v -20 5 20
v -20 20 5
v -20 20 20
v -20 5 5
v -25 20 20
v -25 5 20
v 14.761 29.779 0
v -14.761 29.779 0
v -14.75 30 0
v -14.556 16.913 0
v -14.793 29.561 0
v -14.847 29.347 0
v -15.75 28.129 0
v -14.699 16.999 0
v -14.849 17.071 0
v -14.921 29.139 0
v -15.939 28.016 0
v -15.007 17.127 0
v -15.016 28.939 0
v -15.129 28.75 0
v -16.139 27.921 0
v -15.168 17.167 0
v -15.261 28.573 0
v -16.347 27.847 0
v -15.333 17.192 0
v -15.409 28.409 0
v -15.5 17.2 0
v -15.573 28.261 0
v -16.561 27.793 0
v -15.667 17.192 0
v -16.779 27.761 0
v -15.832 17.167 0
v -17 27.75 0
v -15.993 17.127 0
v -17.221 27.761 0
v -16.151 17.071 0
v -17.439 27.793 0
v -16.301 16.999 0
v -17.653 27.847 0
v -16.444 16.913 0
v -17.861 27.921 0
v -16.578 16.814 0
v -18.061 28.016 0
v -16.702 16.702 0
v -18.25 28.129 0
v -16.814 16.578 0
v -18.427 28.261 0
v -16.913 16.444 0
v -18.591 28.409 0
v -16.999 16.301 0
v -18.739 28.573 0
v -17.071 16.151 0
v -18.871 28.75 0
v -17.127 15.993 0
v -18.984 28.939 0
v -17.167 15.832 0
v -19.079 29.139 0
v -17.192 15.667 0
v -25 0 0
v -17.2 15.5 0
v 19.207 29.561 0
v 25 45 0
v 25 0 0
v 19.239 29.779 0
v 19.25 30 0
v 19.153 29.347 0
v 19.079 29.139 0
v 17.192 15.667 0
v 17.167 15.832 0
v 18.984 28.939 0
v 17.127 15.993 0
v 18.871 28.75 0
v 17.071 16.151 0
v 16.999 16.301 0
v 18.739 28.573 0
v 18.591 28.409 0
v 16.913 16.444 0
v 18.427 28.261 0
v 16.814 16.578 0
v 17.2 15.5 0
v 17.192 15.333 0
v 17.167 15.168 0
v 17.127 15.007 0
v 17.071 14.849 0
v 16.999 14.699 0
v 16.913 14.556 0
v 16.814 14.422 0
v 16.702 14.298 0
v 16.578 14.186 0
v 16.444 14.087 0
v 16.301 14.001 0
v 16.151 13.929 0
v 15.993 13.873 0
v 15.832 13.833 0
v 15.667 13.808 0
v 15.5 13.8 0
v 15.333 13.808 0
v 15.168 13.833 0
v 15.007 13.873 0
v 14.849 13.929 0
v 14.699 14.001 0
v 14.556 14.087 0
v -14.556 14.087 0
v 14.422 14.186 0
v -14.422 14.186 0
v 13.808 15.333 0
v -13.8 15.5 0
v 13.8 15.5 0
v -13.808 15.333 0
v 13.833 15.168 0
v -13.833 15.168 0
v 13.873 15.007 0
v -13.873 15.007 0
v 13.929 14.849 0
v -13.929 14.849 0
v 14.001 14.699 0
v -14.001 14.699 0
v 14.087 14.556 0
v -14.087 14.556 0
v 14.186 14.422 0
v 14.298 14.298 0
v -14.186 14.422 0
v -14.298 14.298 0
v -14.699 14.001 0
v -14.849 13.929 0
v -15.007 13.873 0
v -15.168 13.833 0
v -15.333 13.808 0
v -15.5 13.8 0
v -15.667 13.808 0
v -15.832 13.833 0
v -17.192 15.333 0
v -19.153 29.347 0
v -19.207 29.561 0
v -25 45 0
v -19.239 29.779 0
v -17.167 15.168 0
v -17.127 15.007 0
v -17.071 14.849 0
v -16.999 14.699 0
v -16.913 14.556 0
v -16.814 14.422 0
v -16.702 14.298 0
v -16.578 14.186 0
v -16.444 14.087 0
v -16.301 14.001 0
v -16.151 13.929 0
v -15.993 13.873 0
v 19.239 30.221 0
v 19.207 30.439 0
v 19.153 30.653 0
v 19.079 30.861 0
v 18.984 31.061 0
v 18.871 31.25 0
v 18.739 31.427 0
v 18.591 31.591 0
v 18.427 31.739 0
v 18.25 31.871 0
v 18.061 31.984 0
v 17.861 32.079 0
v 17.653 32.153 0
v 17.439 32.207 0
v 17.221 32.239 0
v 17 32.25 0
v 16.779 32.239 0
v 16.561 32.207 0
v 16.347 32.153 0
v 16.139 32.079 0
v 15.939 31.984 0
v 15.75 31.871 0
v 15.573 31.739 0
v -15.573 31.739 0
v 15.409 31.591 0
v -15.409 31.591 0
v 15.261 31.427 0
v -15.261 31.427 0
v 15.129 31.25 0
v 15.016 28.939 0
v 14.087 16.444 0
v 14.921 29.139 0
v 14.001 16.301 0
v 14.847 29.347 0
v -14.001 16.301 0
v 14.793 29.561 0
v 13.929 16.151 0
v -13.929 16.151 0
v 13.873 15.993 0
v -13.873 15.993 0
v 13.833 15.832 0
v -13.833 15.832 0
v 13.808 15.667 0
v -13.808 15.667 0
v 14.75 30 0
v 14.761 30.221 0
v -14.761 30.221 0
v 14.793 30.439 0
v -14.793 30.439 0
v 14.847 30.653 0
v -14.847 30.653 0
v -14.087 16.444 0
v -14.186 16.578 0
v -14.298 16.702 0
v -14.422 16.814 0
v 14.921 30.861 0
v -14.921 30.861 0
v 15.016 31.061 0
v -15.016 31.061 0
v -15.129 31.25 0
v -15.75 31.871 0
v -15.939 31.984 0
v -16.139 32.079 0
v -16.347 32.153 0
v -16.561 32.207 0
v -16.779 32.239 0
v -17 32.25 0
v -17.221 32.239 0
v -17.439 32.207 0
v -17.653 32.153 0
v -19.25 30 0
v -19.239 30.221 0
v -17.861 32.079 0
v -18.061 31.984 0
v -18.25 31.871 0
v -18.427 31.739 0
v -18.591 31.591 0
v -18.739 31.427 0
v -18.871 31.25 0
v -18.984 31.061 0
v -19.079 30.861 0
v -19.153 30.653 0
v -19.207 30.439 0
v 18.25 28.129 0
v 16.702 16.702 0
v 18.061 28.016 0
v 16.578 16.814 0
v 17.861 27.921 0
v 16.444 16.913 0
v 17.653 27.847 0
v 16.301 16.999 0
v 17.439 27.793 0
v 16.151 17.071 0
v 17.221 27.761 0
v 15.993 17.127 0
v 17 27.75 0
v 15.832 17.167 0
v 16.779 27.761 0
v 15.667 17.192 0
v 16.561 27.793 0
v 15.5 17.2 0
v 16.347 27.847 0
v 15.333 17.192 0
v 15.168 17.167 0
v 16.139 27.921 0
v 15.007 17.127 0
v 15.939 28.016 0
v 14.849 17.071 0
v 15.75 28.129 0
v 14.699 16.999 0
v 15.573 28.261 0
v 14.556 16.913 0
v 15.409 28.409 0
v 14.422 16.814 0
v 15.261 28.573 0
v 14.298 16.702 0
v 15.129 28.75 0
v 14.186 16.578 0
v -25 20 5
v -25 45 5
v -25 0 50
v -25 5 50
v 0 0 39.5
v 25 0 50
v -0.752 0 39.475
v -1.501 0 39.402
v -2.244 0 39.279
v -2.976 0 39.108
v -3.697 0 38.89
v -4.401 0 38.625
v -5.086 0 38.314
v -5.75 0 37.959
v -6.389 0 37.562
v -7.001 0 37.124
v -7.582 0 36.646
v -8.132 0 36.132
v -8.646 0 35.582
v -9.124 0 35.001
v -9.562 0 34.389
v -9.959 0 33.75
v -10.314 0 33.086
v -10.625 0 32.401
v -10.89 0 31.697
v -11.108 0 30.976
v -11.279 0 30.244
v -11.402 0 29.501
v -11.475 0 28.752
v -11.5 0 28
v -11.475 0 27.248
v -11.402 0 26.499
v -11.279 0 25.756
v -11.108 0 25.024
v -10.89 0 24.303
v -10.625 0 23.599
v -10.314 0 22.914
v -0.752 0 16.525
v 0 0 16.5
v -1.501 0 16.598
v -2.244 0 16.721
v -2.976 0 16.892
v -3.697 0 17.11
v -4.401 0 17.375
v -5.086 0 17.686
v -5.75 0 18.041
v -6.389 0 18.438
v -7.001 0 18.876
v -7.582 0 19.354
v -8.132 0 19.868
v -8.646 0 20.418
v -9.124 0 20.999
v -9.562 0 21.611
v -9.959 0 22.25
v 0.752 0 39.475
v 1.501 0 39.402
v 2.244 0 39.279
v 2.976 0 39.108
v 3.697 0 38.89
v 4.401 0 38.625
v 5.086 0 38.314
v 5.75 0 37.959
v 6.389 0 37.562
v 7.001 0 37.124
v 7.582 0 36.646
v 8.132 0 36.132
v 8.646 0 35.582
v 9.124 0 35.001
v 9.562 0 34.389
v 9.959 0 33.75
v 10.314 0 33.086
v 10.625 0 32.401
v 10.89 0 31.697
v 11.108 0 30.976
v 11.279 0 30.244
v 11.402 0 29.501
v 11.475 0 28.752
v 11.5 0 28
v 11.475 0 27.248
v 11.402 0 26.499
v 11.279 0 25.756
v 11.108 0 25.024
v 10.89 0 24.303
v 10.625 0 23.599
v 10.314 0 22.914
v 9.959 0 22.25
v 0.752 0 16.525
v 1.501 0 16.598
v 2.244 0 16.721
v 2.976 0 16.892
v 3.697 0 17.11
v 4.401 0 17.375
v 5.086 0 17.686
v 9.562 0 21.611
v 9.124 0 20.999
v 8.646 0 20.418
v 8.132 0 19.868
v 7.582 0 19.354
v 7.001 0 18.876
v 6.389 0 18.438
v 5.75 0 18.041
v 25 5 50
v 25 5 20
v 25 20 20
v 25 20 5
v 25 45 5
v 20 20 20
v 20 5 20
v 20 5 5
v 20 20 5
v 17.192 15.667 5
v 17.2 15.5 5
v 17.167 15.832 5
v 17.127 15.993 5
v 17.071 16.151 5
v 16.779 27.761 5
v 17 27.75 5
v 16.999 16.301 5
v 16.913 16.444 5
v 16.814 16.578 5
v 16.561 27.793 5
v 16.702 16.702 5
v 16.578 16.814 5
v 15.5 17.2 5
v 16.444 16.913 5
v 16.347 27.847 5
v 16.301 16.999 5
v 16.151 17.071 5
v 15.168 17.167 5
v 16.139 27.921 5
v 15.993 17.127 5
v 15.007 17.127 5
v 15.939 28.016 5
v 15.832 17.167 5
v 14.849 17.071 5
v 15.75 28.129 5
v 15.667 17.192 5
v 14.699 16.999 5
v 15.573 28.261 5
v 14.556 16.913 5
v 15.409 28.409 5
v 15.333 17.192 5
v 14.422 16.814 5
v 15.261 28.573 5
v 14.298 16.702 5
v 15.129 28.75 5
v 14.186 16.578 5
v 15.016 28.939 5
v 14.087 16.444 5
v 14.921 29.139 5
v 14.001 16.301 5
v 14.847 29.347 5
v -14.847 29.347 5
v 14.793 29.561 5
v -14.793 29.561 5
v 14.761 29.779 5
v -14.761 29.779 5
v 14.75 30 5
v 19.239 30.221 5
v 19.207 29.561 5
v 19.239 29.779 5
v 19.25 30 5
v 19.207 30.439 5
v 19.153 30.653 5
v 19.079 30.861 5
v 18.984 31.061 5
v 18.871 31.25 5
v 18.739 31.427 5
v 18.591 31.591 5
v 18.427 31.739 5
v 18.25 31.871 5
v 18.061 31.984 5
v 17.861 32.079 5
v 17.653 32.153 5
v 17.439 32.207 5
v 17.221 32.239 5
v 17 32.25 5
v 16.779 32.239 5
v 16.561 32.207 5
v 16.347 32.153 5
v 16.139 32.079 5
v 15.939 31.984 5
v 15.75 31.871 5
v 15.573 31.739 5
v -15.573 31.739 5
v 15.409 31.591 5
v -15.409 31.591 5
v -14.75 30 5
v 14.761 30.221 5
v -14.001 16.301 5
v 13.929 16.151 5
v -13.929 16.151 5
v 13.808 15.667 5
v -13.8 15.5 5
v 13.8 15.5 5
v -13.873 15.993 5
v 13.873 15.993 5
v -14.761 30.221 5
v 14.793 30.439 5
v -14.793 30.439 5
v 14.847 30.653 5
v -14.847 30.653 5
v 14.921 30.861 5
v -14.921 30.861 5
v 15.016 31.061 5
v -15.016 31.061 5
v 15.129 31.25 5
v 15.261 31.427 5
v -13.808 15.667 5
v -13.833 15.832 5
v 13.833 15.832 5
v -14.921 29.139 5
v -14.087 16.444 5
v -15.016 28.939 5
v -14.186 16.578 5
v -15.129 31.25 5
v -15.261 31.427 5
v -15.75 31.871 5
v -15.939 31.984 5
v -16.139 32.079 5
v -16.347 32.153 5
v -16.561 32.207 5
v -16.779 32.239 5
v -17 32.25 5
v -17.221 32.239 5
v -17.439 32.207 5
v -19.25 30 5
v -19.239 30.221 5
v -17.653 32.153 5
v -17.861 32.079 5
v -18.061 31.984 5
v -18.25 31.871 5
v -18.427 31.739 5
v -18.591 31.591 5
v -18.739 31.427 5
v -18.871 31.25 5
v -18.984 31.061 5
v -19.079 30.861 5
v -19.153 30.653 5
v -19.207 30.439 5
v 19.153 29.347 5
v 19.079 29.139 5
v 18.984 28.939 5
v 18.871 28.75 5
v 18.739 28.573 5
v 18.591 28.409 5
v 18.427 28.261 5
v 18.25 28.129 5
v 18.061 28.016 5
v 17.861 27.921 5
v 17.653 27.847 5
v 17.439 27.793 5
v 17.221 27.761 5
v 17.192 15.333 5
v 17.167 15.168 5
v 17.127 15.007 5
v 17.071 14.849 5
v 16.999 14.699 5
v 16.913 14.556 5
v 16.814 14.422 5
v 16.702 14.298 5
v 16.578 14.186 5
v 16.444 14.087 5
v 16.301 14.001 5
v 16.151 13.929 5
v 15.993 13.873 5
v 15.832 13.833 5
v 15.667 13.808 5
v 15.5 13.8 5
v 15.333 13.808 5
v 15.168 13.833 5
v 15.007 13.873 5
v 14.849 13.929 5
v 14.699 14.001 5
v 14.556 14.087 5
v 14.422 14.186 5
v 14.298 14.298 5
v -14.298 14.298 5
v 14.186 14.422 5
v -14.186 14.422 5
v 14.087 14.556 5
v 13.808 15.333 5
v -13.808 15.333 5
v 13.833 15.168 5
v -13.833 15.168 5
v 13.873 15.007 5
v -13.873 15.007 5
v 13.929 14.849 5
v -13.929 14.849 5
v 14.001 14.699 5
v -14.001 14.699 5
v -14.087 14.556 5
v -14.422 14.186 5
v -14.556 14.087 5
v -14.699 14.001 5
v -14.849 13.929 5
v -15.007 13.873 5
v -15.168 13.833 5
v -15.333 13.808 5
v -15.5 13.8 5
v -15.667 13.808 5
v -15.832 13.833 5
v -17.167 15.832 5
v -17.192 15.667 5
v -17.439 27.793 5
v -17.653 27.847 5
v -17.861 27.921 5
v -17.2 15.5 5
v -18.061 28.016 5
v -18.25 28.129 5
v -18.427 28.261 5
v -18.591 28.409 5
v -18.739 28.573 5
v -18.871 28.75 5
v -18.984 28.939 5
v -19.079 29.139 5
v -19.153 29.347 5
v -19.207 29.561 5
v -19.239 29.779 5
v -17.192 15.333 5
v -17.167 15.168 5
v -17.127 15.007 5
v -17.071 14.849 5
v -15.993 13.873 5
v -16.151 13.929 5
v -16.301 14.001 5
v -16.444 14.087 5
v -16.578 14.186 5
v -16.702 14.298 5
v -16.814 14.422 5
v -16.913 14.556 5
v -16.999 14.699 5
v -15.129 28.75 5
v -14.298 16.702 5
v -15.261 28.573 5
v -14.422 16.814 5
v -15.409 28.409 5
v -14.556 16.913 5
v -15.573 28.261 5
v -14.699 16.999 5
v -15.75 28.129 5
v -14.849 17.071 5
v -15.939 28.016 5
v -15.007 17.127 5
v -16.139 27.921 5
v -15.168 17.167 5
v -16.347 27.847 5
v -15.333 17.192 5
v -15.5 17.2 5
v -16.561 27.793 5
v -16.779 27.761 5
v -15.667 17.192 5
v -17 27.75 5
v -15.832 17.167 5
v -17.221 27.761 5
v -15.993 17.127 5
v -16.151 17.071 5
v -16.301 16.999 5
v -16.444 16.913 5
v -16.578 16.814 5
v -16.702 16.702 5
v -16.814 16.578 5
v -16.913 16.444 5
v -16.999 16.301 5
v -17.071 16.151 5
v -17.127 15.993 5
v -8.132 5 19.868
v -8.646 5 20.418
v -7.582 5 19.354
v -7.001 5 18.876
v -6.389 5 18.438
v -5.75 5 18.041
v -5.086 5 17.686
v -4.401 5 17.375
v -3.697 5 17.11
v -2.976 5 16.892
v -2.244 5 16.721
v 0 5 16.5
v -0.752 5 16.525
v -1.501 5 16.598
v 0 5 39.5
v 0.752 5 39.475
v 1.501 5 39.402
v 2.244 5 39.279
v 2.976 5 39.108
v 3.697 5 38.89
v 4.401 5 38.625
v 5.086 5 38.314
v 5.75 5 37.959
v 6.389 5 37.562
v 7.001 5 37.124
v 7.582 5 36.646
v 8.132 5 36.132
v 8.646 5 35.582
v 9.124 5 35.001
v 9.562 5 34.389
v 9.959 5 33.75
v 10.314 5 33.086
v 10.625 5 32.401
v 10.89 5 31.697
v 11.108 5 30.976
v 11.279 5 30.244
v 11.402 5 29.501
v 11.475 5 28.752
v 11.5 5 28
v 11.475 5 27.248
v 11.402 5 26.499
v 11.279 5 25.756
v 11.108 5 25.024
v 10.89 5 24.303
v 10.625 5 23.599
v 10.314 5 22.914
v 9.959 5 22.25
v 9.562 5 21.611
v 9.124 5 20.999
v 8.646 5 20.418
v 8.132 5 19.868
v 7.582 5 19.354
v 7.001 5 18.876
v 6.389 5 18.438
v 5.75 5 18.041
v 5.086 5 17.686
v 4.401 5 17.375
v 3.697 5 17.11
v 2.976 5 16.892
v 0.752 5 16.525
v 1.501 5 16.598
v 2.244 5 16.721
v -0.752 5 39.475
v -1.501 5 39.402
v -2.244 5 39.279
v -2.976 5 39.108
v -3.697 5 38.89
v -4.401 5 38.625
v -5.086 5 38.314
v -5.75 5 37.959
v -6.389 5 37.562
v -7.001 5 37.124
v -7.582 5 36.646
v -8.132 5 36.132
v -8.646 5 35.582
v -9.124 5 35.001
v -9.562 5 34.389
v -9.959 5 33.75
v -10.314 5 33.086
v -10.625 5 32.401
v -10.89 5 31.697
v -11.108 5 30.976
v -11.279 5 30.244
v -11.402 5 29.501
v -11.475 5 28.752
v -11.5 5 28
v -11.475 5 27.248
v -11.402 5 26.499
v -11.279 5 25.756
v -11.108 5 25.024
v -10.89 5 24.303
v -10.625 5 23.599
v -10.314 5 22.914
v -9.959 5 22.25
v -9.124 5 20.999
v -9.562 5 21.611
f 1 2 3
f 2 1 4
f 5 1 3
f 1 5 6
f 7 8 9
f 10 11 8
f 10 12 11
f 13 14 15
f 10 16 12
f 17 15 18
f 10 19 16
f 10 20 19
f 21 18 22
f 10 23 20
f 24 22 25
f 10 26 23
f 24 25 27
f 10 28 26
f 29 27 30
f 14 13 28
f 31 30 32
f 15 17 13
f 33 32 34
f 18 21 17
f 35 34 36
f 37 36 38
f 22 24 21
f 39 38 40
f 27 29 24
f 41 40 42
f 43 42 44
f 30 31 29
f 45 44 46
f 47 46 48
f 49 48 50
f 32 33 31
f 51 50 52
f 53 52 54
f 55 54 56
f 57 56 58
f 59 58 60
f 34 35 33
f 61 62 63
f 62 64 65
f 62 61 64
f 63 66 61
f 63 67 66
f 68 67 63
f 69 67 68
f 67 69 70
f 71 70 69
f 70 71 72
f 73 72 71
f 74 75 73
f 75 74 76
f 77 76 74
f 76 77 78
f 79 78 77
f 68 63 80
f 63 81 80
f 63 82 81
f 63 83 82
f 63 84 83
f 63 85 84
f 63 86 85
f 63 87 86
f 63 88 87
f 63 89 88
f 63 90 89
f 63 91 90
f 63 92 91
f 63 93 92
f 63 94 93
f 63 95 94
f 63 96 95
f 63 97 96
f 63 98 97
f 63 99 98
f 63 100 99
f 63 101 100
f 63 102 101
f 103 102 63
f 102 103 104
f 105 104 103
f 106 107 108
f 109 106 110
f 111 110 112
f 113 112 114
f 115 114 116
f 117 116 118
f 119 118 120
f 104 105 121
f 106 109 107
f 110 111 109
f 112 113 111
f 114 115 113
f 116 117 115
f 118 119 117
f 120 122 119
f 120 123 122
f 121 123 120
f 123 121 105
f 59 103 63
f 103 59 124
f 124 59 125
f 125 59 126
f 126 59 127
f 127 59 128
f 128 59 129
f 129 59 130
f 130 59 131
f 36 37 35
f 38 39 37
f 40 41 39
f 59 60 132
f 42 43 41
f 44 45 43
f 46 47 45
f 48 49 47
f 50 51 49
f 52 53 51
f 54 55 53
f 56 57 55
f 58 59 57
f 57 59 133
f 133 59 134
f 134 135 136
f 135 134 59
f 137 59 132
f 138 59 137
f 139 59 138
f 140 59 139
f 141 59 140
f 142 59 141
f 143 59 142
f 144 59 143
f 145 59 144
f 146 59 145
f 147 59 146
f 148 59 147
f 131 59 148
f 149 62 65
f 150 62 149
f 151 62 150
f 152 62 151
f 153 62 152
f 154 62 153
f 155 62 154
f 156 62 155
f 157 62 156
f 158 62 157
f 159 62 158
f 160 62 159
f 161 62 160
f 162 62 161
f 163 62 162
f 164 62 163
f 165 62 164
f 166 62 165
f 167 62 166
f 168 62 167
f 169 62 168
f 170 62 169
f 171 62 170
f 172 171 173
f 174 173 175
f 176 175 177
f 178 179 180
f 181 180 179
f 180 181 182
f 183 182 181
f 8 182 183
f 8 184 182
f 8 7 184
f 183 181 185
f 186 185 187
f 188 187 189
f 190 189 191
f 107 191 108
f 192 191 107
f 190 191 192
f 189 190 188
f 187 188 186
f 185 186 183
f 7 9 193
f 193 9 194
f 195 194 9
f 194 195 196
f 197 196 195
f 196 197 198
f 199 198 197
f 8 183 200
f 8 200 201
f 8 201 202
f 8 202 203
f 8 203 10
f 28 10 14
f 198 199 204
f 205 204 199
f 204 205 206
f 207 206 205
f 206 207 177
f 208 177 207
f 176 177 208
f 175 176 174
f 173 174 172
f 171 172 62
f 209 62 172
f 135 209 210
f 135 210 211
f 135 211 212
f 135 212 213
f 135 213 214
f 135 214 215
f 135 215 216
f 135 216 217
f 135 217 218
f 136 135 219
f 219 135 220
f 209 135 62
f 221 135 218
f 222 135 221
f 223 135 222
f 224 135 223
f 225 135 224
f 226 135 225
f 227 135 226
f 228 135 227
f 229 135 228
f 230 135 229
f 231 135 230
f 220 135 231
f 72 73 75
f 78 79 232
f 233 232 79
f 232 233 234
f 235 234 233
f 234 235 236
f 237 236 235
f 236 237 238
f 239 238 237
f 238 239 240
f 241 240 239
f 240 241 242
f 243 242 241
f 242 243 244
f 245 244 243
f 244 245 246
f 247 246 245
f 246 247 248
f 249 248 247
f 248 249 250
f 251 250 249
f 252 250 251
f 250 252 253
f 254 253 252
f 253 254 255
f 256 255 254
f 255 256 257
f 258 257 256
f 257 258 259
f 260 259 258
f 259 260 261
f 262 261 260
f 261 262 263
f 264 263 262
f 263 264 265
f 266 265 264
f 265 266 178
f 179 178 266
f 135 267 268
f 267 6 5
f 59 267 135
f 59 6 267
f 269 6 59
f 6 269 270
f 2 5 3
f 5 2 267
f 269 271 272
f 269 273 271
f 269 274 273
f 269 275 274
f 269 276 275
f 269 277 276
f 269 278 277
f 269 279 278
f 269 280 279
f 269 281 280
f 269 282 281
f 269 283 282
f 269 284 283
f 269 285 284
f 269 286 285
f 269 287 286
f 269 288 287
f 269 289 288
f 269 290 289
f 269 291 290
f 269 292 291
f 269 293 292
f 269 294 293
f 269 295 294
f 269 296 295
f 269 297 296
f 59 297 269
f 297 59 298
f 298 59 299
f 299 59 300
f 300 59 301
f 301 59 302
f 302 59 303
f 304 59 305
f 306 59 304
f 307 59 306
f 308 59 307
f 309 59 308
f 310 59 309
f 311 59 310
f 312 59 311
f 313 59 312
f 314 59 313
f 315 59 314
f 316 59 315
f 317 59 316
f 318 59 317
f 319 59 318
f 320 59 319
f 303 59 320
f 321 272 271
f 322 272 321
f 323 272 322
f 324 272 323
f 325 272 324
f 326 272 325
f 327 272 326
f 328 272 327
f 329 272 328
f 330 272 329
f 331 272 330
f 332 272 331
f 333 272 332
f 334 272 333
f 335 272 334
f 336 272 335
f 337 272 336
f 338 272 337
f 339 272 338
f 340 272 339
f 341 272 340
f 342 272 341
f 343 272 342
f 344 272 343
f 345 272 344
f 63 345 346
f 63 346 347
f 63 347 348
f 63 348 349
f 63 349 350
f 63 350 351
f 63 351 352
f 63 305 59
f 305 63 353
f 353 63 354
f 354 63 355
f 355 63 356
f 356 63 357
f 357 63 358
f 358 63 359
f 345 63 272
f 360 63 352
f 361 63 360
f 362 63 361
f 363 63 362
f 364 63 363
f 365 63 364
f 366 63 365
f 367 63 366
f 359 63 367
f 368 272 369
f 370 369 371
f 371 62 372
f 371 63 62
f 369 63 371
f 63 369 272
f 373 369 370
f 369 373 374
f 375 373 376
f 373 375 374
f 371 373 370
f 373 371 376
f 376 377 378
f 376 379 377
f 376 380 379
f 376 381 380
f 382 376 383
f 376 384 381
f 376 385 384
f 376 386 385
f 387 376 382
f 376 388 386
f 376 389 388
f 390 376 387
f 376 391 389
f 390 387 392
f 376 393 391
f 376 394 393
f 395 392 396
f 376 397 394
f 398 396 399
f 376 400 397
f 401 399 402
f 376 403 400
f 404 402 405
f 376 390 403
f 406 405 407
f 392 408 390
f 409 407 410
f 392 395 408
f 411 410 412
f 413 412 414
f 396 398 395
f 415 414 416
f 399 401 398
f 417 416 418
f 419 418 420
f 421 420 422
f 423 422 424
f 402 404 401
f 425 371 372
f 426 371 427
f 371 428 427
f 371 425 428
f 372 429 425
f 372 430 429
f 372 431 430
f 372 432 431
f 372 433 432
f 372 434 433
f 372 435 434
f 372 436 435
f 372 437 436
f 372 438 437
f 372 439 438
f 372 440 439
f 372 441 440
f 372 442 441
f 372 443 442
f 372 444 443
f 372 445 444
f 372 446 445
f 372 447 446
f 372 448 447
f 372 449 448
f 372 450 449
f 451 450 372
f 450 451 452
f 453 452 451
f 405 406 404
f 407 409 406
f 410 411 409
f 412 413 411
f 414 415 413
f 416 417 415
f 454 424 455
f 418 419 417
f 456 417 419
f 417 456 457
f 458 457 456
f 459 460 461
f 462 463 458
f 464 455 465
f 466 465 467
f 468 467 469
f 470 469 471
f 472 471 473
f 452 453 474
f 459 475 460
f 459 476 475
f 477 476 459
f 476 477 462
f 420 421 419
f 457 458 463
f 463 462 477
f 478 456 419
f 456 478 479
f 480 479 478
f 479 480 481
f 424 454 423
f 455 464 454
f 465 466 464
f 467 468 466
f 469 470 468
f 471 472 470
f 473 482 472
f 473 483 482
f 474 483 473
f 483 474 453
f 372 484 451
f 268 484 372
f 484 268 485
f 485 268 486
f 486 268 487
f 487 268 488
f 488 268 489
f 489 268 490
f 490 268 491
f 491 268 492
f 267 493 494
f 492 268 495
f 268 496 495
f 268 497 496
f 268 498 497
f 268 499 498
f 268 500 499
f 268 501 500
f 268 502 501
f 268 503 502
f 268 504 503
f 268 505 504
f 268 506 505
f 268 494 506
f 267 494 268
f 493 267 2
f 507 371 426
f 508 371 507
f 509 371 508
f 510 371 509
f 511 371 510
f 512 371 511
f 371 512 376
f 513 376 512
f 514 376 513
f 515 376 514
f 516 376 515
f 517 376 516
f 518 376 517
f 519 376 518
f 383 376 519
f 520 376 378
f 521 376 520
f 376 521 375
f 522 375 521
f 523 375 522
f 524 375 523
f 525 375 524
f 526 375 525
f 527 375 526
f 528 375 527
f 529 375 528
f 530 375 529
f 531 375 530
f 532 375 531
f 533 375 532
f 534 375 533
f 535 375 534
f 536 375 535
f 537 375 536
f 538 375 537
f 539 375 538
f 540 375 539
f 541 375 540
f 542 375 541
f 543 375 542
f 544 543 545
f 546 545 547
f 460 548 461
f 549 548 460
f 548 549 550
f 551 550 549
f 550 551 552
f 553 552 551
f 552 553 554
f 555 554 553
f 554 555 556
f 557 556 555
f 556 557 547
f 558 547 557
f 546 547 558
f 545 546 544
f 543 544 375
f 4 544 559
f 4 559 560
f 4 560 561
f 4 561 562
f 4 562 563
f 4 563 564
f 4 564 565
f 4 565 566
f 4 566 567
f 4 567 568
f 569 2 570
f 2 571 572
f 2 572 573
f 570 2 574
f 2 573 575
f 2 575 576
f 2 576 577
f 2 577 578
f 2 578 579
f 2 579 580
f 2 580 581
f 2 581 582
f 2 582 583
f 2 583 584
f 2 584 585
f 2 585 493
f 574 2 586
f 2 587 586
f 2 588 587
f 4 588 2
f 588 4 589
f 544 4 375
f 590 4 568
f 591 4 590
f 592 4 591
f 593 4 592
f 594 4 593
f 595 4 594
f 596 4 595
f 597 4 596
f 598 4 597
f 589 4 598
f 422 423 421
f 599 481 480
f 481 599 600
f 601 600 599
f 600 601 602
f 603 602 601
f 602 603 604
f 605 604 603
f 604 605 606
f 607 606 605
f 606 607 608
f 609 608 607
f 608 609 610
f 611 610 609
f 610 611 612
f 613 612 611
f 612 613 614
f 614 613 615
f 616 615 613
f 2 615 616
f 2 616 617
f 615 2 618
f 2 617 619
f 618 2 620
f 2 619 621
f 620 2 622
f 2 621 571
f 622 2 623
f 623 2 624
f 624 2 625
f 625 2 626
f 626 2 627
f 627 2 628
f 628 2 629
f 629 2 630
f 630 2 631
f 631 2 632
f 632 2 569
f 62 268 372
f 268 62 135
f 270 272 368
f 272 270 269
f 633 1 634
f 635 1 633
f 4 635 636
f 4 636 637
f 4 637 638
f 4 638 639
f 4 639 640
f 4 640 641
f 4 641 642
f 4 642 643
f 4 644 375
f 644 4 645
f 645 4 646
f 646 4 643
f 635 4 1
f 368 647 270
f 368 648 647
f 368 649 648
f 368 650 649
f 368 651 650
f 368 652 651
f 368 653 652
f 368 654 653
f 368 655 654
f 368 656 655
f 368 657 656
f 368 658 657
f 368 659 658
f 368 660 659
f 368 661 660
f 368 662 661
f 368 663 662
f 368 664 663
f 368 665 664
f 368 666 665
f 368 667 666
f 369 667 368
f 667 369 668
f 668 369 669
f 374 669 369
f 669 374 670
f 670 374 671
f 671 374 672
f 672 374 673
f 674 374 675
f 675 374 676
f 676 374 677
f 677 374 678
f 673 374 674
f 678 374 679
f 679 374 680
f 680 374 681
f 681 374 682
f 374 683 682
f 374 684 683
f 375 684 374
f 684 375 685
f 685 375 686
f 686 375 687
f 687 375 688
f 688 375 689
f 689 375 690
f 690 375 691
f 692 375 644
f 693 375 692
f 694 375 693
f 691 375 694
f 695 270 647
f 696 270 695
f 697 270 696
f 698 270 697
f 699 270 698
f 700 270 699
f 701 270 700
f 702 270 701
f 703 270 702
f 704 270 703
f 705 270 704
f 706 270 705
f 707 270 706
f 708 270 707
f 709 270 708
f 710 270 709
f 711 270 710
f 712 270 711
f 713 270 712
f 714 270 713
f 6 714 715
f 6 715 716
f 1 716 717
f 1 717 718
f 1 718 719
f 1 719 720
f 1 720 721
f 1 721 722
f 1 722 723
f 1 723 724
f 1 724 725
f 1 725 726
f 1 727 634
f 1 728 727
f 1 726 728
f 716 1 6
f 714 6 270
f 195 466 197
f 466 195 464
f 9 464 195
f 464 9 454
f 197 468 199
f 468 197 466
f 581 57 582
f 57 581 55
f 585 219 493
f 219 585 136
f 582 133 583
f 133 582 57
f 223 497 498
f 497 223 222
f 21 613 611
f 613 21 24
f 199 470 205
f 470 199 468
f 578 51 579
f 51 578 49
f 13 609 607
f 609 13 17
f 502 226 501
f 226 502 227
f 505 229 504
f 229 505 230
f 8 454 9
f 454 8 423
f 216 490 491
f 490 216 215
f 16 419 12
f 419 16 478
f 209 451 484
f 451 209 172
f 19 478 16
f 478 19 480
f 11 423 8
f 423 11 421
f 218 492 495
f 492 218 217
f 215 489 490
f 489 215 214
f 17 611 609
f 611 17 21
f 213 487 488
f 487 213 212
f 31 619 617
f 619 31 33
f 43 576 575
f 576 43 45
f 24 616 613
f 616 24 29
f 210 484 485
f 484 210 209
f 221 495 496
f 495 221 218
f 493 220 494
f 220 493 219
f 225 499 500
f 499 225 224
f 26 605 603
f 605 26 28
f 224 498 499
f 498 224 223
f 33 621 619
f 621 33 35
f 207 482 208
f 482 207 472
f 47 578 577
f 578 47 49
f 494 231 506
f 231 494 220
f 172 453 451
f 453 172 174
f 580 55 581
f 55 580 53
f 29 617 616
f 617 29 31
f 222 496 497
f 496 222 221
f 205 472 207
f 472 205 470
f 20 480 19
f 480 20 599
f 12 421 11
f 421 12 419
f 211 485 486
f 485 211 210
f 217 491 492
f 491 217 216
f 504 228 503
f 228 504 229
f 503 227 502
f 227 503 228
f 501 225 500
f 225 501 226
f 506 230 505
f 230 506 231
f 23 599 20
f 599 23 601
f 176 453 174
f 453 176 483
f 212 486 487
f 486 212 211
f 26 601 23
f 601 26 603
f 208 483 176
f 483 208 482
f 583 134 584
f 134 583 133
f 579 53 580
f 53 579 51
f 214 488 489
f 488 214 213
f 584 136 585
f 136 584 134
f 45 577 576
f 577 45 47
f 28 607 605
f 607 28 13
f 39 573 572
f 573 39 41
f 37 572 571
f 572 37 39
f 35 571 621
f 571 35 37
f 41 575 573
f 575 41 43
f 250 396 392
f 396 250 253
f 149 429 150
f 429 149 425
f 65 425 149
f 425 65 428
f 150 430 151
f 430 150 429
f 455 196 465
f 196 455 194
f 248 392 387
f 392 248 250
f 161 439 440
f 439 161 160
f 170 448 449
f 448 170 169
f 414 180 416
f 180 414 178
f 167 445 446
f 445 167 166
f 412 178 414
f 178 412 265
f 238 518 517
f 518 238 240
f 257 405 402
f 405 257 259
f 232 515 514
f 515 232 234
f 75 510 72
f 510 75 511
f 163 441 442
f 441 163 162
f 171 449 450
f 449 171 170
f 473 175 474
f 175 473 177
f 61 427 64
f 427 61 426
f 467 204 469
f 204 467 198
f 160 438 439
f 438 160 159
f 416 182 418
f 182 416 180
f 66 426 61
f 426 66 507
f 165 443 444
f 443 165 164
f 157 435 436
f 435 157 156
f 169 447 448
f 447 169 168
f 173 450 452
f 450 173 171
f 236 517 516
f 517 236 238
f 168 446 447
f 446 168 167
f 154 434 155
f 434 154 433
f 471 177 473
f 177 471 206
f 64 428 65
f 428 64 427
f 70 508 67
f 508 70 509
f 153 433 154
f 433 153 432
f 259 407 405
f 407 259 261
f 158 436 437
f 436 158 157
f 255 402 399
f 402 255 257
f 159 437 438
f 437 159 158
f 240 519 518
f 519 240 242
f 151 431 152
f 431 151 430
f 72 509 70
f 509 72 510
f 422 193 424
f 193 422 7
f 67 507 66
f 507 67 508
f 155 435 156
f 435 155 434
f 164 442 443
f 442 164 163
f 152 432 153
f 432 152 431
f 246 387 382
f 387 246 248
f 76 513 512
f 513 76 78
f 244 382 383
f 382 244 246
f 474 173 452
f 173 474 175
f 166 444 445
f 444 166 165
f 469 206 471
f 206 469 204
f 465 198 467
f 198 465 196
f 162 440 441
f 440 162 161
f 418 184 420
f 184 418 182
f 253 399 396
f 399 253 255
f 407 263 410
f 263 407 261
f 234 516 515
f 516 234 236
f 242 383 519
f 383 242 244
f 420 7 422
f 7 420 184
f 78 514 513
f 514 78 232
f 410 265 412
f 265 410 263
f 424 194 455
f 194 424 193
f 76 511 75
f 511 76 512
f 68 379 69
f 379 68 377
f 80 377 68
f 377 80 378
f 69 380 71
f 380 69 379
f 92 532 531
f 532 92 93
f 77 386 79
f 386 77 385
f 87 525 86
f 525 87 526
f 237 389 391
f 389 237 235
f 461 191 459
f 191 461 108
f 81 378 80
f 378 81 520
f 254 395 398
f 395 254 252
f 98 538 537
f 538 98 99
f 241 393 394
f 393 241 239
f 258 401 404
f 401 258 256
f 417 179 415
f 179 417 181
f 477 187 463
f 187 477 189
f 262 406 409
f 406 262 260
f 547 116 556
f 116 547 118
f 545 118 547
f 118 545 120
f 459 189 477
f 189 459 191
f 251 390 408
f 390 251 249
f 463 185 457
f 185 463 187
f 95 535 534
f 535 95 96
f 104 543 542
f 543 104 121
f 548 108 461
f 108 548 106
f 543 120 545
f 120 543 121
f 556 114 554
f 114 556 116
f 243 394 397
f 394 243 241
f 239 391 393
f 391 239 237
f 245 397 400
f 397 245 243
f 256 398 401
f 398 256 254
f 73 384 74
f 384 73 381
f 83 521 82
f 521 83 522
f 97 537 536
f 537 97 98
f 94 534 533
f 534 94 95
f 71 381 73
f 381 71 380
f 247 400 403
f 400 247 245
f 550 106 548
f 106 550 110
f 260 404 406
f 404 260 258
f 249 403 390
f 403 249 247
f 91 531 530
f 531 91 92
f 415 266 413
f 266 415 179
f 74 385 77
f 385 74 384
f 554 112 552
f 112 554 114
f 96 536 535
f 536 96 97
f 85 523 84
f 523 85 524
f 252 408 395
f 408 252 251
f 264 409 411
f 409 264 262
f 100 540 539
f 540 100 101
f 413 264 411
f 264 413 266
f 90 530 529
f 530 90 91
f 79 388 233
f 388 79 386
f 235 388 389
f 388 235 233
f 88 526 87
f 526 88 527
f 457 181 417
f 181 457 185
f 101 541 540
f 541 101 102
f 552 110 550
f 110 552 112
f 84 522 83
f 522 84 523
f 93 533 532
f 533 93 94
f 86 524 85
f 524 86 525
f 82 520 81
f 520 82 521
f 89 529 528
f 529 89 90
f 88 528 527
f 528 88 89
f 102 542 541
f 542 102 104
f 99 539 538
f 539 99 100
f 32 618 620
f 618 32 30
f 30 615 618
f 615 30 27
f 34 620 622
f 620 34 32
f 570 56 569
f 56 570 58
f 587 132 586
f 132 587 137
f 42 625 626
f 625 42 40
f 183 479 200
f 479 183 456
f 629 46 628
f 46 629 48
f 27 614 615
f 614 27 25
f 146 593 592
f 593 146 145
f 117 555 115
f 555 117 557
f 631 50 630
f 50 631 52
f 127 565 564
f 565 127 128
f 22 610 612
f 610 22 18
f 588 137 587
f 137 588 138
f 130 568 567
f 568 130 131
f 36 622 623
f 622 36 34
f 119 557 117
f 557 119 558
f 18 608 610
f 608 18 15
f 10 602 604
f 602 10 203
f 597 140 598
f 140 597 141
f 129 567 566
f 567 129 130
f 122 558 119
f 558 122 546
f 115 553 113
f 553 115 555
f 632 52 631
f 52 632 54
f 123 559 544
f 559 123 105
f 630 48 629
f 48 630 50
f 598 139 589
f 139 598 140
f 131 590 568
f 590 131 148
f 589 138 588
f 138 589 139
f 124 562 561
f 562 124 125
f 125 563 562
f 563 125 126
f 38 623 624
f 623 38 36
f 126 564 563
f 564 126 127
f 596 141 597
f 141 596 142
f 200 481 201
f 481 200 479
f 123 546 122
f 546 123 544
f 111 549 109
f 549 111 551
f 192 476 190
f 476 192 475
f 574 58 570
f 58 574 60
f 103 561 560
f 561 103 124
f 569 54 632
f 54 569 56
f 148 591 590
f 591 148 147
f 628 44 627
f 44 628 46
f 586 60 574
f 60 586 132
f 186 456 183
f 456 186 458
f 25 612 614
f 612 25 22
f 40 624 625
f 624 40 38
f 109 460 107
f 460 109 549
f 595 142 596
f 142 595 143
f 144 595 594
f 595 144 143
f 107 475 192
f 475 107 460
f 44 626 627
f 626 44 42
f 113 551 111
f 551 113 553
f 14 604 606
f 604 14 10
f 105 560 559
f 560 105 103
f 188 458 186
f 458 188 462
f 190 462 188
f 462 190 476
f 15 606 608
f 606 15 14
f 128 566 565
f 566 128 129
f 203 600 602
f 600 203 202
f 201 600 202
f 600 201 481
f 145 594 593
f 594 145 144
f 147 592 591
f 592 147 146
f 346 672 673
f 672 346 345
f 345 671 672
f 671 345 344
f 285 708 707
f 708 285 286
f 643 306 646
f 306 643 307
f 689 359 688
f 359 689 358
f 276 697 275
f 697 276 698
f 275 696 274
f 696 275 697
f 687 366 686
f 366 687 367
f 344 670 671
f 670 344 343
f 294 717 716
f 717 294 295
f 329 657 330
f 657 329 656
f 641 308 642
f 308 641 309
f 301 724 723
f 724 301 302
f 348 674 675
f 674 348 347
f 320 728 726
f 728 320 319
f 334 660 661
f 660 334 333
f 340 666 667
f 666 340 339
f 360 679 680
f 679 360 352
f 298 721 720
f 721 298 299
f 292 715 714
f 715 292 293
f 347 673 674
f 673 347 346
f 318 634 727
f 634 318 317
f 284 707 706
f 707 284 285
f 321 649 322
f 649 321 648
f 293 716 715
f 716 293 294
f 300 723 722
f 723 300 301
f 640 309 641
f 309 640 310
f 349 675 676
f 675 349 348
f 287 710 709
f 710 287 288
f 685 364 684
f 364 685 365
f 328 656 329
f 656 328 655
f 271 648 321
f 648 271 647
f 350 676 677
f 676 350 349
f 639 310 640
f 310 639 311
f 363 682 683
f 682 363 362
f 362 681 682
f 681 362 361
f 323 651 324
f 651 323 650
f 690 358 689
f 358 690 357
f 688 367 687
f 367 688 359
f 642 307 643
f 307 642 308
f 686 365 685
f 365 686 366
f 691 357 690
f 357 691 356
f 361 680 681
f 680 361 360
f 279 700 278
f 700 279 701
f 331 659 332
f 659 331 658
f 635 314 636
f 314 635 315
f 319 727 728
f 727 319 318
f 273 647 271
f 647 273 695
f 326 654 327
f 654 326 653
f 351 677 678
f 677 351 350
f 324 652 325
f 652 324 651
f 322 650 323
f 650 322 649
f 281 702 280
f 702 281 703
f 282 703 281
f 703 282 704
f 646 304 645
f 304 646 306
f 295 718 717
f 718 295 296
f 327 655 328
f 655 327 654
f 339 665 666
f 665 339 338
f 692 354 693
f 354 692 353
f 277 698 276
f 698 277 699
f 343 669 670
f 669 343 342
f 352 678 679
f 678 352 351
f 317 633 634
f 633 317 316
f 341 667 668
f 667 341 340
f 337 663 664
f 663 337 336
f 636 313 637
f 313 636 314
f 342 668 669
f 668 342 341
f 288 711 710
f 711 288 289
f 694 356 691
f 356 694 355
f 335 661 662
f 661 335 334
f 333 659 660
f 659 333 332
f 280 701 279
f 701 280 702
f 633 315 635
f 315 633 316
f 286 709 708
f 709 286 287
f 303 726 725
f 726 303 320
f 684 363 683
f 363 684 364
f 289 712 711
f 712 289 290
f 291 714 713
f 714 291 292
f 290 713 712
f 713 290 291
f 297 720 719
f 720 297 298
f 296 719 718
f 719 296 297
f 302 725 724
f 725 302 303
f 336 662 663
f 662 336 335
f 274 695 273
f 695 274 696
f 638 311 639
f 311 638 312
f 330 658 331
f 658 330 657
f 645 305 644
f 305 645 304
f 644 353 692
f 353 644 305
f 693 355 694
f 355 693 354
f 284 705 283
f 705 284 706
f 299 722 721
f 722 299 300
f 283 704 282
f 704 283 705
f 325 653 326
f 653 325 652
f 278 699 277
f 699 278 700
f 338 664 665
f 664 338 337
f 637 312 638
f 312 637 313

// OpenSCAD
// L-shaped mounting bracket for NEMA 17 stepper motor
// Print orientation: base plate on bed, motor plate building up in +Z

// ---------- Parameters ----------
base_x      = 25;    // base plate half-width in X
base_y      = 45;    // base plate length in Y
base_z      = 5;     // base plate thickness in Z

hole_m4_x   = 17;    // M4 hole offset from centre in X (both holes)
hole_m4_y   = 30;    // M4 hole position in Y
hole_m4_d   = 4.5;   // M4 hole diameter

plate_x     = 25;    // motor plate half-width in X
plate_z     = 50;    // motor plate height in Z

boss_d      = 23;    // motor boss hole diameter
boss_x      = 0;     // boss hole X position
boss_z      = 28;    // boss hole Z position

screw_d     = 3.4;   // M3 screw hole diameter
screw_pitch = 31;    // square pattern side length for screw holes

gusset_t    = 5;     // gusset thickness (in X)
gusset_leg  = 20;    // right-triangle leg length (in Y and Z)

eps         = 0.5;   // cutter overshoot past faces

$fn = 96;            // curve resolution

// ---------- Model ----------
difference() {
    union() {
        // Base plate
        translate([-base_x, 0, 0])
            cube([2 * base_x, base_y, base_z]);

        // Vertical motor plate, standing on the back edge of the base
        translate([-plate_x, 0, 0])
            cube([2 * plate_x, base_z, plate_z]);

        // Triangular gussets, flush with the left and right edges
        for (sx = [-1, 1])
            translate([sx > 0 ? 20 : -25, 0, 0])
                cube([gusset_t, gusset_leg, gusset_leg]);
    }

    // Two M4 vertical through-holes in the base plate
    for (sx = [-1, 1])
        translate([sx * hole_m4_x, hole_m4_y, -eps])
            cylinder(d = hole_m4_d, h = base_z + plate_z + 2 * eps, $fn = 64);

    // Motor boss hole cut along Y through the motor plate
    translate([boss_x, -eps, boss_z])
        rotate([-90, 0, 0])
            cylinder(d = boss_d, h = 2 * plate_x + 2 * eps, $fn = 96);

    // Four M3 screw holes on a square pattern centred on the boss hole
    for (a = [0, 90, 180, 270])
        rotate([0, 0, a])
            translate([screw_pitch / 2, screw_pitch / 2, -eps])
                cylinder(d = screw_d, h = plate_z + 2 * eps, $fn = 64);
}
